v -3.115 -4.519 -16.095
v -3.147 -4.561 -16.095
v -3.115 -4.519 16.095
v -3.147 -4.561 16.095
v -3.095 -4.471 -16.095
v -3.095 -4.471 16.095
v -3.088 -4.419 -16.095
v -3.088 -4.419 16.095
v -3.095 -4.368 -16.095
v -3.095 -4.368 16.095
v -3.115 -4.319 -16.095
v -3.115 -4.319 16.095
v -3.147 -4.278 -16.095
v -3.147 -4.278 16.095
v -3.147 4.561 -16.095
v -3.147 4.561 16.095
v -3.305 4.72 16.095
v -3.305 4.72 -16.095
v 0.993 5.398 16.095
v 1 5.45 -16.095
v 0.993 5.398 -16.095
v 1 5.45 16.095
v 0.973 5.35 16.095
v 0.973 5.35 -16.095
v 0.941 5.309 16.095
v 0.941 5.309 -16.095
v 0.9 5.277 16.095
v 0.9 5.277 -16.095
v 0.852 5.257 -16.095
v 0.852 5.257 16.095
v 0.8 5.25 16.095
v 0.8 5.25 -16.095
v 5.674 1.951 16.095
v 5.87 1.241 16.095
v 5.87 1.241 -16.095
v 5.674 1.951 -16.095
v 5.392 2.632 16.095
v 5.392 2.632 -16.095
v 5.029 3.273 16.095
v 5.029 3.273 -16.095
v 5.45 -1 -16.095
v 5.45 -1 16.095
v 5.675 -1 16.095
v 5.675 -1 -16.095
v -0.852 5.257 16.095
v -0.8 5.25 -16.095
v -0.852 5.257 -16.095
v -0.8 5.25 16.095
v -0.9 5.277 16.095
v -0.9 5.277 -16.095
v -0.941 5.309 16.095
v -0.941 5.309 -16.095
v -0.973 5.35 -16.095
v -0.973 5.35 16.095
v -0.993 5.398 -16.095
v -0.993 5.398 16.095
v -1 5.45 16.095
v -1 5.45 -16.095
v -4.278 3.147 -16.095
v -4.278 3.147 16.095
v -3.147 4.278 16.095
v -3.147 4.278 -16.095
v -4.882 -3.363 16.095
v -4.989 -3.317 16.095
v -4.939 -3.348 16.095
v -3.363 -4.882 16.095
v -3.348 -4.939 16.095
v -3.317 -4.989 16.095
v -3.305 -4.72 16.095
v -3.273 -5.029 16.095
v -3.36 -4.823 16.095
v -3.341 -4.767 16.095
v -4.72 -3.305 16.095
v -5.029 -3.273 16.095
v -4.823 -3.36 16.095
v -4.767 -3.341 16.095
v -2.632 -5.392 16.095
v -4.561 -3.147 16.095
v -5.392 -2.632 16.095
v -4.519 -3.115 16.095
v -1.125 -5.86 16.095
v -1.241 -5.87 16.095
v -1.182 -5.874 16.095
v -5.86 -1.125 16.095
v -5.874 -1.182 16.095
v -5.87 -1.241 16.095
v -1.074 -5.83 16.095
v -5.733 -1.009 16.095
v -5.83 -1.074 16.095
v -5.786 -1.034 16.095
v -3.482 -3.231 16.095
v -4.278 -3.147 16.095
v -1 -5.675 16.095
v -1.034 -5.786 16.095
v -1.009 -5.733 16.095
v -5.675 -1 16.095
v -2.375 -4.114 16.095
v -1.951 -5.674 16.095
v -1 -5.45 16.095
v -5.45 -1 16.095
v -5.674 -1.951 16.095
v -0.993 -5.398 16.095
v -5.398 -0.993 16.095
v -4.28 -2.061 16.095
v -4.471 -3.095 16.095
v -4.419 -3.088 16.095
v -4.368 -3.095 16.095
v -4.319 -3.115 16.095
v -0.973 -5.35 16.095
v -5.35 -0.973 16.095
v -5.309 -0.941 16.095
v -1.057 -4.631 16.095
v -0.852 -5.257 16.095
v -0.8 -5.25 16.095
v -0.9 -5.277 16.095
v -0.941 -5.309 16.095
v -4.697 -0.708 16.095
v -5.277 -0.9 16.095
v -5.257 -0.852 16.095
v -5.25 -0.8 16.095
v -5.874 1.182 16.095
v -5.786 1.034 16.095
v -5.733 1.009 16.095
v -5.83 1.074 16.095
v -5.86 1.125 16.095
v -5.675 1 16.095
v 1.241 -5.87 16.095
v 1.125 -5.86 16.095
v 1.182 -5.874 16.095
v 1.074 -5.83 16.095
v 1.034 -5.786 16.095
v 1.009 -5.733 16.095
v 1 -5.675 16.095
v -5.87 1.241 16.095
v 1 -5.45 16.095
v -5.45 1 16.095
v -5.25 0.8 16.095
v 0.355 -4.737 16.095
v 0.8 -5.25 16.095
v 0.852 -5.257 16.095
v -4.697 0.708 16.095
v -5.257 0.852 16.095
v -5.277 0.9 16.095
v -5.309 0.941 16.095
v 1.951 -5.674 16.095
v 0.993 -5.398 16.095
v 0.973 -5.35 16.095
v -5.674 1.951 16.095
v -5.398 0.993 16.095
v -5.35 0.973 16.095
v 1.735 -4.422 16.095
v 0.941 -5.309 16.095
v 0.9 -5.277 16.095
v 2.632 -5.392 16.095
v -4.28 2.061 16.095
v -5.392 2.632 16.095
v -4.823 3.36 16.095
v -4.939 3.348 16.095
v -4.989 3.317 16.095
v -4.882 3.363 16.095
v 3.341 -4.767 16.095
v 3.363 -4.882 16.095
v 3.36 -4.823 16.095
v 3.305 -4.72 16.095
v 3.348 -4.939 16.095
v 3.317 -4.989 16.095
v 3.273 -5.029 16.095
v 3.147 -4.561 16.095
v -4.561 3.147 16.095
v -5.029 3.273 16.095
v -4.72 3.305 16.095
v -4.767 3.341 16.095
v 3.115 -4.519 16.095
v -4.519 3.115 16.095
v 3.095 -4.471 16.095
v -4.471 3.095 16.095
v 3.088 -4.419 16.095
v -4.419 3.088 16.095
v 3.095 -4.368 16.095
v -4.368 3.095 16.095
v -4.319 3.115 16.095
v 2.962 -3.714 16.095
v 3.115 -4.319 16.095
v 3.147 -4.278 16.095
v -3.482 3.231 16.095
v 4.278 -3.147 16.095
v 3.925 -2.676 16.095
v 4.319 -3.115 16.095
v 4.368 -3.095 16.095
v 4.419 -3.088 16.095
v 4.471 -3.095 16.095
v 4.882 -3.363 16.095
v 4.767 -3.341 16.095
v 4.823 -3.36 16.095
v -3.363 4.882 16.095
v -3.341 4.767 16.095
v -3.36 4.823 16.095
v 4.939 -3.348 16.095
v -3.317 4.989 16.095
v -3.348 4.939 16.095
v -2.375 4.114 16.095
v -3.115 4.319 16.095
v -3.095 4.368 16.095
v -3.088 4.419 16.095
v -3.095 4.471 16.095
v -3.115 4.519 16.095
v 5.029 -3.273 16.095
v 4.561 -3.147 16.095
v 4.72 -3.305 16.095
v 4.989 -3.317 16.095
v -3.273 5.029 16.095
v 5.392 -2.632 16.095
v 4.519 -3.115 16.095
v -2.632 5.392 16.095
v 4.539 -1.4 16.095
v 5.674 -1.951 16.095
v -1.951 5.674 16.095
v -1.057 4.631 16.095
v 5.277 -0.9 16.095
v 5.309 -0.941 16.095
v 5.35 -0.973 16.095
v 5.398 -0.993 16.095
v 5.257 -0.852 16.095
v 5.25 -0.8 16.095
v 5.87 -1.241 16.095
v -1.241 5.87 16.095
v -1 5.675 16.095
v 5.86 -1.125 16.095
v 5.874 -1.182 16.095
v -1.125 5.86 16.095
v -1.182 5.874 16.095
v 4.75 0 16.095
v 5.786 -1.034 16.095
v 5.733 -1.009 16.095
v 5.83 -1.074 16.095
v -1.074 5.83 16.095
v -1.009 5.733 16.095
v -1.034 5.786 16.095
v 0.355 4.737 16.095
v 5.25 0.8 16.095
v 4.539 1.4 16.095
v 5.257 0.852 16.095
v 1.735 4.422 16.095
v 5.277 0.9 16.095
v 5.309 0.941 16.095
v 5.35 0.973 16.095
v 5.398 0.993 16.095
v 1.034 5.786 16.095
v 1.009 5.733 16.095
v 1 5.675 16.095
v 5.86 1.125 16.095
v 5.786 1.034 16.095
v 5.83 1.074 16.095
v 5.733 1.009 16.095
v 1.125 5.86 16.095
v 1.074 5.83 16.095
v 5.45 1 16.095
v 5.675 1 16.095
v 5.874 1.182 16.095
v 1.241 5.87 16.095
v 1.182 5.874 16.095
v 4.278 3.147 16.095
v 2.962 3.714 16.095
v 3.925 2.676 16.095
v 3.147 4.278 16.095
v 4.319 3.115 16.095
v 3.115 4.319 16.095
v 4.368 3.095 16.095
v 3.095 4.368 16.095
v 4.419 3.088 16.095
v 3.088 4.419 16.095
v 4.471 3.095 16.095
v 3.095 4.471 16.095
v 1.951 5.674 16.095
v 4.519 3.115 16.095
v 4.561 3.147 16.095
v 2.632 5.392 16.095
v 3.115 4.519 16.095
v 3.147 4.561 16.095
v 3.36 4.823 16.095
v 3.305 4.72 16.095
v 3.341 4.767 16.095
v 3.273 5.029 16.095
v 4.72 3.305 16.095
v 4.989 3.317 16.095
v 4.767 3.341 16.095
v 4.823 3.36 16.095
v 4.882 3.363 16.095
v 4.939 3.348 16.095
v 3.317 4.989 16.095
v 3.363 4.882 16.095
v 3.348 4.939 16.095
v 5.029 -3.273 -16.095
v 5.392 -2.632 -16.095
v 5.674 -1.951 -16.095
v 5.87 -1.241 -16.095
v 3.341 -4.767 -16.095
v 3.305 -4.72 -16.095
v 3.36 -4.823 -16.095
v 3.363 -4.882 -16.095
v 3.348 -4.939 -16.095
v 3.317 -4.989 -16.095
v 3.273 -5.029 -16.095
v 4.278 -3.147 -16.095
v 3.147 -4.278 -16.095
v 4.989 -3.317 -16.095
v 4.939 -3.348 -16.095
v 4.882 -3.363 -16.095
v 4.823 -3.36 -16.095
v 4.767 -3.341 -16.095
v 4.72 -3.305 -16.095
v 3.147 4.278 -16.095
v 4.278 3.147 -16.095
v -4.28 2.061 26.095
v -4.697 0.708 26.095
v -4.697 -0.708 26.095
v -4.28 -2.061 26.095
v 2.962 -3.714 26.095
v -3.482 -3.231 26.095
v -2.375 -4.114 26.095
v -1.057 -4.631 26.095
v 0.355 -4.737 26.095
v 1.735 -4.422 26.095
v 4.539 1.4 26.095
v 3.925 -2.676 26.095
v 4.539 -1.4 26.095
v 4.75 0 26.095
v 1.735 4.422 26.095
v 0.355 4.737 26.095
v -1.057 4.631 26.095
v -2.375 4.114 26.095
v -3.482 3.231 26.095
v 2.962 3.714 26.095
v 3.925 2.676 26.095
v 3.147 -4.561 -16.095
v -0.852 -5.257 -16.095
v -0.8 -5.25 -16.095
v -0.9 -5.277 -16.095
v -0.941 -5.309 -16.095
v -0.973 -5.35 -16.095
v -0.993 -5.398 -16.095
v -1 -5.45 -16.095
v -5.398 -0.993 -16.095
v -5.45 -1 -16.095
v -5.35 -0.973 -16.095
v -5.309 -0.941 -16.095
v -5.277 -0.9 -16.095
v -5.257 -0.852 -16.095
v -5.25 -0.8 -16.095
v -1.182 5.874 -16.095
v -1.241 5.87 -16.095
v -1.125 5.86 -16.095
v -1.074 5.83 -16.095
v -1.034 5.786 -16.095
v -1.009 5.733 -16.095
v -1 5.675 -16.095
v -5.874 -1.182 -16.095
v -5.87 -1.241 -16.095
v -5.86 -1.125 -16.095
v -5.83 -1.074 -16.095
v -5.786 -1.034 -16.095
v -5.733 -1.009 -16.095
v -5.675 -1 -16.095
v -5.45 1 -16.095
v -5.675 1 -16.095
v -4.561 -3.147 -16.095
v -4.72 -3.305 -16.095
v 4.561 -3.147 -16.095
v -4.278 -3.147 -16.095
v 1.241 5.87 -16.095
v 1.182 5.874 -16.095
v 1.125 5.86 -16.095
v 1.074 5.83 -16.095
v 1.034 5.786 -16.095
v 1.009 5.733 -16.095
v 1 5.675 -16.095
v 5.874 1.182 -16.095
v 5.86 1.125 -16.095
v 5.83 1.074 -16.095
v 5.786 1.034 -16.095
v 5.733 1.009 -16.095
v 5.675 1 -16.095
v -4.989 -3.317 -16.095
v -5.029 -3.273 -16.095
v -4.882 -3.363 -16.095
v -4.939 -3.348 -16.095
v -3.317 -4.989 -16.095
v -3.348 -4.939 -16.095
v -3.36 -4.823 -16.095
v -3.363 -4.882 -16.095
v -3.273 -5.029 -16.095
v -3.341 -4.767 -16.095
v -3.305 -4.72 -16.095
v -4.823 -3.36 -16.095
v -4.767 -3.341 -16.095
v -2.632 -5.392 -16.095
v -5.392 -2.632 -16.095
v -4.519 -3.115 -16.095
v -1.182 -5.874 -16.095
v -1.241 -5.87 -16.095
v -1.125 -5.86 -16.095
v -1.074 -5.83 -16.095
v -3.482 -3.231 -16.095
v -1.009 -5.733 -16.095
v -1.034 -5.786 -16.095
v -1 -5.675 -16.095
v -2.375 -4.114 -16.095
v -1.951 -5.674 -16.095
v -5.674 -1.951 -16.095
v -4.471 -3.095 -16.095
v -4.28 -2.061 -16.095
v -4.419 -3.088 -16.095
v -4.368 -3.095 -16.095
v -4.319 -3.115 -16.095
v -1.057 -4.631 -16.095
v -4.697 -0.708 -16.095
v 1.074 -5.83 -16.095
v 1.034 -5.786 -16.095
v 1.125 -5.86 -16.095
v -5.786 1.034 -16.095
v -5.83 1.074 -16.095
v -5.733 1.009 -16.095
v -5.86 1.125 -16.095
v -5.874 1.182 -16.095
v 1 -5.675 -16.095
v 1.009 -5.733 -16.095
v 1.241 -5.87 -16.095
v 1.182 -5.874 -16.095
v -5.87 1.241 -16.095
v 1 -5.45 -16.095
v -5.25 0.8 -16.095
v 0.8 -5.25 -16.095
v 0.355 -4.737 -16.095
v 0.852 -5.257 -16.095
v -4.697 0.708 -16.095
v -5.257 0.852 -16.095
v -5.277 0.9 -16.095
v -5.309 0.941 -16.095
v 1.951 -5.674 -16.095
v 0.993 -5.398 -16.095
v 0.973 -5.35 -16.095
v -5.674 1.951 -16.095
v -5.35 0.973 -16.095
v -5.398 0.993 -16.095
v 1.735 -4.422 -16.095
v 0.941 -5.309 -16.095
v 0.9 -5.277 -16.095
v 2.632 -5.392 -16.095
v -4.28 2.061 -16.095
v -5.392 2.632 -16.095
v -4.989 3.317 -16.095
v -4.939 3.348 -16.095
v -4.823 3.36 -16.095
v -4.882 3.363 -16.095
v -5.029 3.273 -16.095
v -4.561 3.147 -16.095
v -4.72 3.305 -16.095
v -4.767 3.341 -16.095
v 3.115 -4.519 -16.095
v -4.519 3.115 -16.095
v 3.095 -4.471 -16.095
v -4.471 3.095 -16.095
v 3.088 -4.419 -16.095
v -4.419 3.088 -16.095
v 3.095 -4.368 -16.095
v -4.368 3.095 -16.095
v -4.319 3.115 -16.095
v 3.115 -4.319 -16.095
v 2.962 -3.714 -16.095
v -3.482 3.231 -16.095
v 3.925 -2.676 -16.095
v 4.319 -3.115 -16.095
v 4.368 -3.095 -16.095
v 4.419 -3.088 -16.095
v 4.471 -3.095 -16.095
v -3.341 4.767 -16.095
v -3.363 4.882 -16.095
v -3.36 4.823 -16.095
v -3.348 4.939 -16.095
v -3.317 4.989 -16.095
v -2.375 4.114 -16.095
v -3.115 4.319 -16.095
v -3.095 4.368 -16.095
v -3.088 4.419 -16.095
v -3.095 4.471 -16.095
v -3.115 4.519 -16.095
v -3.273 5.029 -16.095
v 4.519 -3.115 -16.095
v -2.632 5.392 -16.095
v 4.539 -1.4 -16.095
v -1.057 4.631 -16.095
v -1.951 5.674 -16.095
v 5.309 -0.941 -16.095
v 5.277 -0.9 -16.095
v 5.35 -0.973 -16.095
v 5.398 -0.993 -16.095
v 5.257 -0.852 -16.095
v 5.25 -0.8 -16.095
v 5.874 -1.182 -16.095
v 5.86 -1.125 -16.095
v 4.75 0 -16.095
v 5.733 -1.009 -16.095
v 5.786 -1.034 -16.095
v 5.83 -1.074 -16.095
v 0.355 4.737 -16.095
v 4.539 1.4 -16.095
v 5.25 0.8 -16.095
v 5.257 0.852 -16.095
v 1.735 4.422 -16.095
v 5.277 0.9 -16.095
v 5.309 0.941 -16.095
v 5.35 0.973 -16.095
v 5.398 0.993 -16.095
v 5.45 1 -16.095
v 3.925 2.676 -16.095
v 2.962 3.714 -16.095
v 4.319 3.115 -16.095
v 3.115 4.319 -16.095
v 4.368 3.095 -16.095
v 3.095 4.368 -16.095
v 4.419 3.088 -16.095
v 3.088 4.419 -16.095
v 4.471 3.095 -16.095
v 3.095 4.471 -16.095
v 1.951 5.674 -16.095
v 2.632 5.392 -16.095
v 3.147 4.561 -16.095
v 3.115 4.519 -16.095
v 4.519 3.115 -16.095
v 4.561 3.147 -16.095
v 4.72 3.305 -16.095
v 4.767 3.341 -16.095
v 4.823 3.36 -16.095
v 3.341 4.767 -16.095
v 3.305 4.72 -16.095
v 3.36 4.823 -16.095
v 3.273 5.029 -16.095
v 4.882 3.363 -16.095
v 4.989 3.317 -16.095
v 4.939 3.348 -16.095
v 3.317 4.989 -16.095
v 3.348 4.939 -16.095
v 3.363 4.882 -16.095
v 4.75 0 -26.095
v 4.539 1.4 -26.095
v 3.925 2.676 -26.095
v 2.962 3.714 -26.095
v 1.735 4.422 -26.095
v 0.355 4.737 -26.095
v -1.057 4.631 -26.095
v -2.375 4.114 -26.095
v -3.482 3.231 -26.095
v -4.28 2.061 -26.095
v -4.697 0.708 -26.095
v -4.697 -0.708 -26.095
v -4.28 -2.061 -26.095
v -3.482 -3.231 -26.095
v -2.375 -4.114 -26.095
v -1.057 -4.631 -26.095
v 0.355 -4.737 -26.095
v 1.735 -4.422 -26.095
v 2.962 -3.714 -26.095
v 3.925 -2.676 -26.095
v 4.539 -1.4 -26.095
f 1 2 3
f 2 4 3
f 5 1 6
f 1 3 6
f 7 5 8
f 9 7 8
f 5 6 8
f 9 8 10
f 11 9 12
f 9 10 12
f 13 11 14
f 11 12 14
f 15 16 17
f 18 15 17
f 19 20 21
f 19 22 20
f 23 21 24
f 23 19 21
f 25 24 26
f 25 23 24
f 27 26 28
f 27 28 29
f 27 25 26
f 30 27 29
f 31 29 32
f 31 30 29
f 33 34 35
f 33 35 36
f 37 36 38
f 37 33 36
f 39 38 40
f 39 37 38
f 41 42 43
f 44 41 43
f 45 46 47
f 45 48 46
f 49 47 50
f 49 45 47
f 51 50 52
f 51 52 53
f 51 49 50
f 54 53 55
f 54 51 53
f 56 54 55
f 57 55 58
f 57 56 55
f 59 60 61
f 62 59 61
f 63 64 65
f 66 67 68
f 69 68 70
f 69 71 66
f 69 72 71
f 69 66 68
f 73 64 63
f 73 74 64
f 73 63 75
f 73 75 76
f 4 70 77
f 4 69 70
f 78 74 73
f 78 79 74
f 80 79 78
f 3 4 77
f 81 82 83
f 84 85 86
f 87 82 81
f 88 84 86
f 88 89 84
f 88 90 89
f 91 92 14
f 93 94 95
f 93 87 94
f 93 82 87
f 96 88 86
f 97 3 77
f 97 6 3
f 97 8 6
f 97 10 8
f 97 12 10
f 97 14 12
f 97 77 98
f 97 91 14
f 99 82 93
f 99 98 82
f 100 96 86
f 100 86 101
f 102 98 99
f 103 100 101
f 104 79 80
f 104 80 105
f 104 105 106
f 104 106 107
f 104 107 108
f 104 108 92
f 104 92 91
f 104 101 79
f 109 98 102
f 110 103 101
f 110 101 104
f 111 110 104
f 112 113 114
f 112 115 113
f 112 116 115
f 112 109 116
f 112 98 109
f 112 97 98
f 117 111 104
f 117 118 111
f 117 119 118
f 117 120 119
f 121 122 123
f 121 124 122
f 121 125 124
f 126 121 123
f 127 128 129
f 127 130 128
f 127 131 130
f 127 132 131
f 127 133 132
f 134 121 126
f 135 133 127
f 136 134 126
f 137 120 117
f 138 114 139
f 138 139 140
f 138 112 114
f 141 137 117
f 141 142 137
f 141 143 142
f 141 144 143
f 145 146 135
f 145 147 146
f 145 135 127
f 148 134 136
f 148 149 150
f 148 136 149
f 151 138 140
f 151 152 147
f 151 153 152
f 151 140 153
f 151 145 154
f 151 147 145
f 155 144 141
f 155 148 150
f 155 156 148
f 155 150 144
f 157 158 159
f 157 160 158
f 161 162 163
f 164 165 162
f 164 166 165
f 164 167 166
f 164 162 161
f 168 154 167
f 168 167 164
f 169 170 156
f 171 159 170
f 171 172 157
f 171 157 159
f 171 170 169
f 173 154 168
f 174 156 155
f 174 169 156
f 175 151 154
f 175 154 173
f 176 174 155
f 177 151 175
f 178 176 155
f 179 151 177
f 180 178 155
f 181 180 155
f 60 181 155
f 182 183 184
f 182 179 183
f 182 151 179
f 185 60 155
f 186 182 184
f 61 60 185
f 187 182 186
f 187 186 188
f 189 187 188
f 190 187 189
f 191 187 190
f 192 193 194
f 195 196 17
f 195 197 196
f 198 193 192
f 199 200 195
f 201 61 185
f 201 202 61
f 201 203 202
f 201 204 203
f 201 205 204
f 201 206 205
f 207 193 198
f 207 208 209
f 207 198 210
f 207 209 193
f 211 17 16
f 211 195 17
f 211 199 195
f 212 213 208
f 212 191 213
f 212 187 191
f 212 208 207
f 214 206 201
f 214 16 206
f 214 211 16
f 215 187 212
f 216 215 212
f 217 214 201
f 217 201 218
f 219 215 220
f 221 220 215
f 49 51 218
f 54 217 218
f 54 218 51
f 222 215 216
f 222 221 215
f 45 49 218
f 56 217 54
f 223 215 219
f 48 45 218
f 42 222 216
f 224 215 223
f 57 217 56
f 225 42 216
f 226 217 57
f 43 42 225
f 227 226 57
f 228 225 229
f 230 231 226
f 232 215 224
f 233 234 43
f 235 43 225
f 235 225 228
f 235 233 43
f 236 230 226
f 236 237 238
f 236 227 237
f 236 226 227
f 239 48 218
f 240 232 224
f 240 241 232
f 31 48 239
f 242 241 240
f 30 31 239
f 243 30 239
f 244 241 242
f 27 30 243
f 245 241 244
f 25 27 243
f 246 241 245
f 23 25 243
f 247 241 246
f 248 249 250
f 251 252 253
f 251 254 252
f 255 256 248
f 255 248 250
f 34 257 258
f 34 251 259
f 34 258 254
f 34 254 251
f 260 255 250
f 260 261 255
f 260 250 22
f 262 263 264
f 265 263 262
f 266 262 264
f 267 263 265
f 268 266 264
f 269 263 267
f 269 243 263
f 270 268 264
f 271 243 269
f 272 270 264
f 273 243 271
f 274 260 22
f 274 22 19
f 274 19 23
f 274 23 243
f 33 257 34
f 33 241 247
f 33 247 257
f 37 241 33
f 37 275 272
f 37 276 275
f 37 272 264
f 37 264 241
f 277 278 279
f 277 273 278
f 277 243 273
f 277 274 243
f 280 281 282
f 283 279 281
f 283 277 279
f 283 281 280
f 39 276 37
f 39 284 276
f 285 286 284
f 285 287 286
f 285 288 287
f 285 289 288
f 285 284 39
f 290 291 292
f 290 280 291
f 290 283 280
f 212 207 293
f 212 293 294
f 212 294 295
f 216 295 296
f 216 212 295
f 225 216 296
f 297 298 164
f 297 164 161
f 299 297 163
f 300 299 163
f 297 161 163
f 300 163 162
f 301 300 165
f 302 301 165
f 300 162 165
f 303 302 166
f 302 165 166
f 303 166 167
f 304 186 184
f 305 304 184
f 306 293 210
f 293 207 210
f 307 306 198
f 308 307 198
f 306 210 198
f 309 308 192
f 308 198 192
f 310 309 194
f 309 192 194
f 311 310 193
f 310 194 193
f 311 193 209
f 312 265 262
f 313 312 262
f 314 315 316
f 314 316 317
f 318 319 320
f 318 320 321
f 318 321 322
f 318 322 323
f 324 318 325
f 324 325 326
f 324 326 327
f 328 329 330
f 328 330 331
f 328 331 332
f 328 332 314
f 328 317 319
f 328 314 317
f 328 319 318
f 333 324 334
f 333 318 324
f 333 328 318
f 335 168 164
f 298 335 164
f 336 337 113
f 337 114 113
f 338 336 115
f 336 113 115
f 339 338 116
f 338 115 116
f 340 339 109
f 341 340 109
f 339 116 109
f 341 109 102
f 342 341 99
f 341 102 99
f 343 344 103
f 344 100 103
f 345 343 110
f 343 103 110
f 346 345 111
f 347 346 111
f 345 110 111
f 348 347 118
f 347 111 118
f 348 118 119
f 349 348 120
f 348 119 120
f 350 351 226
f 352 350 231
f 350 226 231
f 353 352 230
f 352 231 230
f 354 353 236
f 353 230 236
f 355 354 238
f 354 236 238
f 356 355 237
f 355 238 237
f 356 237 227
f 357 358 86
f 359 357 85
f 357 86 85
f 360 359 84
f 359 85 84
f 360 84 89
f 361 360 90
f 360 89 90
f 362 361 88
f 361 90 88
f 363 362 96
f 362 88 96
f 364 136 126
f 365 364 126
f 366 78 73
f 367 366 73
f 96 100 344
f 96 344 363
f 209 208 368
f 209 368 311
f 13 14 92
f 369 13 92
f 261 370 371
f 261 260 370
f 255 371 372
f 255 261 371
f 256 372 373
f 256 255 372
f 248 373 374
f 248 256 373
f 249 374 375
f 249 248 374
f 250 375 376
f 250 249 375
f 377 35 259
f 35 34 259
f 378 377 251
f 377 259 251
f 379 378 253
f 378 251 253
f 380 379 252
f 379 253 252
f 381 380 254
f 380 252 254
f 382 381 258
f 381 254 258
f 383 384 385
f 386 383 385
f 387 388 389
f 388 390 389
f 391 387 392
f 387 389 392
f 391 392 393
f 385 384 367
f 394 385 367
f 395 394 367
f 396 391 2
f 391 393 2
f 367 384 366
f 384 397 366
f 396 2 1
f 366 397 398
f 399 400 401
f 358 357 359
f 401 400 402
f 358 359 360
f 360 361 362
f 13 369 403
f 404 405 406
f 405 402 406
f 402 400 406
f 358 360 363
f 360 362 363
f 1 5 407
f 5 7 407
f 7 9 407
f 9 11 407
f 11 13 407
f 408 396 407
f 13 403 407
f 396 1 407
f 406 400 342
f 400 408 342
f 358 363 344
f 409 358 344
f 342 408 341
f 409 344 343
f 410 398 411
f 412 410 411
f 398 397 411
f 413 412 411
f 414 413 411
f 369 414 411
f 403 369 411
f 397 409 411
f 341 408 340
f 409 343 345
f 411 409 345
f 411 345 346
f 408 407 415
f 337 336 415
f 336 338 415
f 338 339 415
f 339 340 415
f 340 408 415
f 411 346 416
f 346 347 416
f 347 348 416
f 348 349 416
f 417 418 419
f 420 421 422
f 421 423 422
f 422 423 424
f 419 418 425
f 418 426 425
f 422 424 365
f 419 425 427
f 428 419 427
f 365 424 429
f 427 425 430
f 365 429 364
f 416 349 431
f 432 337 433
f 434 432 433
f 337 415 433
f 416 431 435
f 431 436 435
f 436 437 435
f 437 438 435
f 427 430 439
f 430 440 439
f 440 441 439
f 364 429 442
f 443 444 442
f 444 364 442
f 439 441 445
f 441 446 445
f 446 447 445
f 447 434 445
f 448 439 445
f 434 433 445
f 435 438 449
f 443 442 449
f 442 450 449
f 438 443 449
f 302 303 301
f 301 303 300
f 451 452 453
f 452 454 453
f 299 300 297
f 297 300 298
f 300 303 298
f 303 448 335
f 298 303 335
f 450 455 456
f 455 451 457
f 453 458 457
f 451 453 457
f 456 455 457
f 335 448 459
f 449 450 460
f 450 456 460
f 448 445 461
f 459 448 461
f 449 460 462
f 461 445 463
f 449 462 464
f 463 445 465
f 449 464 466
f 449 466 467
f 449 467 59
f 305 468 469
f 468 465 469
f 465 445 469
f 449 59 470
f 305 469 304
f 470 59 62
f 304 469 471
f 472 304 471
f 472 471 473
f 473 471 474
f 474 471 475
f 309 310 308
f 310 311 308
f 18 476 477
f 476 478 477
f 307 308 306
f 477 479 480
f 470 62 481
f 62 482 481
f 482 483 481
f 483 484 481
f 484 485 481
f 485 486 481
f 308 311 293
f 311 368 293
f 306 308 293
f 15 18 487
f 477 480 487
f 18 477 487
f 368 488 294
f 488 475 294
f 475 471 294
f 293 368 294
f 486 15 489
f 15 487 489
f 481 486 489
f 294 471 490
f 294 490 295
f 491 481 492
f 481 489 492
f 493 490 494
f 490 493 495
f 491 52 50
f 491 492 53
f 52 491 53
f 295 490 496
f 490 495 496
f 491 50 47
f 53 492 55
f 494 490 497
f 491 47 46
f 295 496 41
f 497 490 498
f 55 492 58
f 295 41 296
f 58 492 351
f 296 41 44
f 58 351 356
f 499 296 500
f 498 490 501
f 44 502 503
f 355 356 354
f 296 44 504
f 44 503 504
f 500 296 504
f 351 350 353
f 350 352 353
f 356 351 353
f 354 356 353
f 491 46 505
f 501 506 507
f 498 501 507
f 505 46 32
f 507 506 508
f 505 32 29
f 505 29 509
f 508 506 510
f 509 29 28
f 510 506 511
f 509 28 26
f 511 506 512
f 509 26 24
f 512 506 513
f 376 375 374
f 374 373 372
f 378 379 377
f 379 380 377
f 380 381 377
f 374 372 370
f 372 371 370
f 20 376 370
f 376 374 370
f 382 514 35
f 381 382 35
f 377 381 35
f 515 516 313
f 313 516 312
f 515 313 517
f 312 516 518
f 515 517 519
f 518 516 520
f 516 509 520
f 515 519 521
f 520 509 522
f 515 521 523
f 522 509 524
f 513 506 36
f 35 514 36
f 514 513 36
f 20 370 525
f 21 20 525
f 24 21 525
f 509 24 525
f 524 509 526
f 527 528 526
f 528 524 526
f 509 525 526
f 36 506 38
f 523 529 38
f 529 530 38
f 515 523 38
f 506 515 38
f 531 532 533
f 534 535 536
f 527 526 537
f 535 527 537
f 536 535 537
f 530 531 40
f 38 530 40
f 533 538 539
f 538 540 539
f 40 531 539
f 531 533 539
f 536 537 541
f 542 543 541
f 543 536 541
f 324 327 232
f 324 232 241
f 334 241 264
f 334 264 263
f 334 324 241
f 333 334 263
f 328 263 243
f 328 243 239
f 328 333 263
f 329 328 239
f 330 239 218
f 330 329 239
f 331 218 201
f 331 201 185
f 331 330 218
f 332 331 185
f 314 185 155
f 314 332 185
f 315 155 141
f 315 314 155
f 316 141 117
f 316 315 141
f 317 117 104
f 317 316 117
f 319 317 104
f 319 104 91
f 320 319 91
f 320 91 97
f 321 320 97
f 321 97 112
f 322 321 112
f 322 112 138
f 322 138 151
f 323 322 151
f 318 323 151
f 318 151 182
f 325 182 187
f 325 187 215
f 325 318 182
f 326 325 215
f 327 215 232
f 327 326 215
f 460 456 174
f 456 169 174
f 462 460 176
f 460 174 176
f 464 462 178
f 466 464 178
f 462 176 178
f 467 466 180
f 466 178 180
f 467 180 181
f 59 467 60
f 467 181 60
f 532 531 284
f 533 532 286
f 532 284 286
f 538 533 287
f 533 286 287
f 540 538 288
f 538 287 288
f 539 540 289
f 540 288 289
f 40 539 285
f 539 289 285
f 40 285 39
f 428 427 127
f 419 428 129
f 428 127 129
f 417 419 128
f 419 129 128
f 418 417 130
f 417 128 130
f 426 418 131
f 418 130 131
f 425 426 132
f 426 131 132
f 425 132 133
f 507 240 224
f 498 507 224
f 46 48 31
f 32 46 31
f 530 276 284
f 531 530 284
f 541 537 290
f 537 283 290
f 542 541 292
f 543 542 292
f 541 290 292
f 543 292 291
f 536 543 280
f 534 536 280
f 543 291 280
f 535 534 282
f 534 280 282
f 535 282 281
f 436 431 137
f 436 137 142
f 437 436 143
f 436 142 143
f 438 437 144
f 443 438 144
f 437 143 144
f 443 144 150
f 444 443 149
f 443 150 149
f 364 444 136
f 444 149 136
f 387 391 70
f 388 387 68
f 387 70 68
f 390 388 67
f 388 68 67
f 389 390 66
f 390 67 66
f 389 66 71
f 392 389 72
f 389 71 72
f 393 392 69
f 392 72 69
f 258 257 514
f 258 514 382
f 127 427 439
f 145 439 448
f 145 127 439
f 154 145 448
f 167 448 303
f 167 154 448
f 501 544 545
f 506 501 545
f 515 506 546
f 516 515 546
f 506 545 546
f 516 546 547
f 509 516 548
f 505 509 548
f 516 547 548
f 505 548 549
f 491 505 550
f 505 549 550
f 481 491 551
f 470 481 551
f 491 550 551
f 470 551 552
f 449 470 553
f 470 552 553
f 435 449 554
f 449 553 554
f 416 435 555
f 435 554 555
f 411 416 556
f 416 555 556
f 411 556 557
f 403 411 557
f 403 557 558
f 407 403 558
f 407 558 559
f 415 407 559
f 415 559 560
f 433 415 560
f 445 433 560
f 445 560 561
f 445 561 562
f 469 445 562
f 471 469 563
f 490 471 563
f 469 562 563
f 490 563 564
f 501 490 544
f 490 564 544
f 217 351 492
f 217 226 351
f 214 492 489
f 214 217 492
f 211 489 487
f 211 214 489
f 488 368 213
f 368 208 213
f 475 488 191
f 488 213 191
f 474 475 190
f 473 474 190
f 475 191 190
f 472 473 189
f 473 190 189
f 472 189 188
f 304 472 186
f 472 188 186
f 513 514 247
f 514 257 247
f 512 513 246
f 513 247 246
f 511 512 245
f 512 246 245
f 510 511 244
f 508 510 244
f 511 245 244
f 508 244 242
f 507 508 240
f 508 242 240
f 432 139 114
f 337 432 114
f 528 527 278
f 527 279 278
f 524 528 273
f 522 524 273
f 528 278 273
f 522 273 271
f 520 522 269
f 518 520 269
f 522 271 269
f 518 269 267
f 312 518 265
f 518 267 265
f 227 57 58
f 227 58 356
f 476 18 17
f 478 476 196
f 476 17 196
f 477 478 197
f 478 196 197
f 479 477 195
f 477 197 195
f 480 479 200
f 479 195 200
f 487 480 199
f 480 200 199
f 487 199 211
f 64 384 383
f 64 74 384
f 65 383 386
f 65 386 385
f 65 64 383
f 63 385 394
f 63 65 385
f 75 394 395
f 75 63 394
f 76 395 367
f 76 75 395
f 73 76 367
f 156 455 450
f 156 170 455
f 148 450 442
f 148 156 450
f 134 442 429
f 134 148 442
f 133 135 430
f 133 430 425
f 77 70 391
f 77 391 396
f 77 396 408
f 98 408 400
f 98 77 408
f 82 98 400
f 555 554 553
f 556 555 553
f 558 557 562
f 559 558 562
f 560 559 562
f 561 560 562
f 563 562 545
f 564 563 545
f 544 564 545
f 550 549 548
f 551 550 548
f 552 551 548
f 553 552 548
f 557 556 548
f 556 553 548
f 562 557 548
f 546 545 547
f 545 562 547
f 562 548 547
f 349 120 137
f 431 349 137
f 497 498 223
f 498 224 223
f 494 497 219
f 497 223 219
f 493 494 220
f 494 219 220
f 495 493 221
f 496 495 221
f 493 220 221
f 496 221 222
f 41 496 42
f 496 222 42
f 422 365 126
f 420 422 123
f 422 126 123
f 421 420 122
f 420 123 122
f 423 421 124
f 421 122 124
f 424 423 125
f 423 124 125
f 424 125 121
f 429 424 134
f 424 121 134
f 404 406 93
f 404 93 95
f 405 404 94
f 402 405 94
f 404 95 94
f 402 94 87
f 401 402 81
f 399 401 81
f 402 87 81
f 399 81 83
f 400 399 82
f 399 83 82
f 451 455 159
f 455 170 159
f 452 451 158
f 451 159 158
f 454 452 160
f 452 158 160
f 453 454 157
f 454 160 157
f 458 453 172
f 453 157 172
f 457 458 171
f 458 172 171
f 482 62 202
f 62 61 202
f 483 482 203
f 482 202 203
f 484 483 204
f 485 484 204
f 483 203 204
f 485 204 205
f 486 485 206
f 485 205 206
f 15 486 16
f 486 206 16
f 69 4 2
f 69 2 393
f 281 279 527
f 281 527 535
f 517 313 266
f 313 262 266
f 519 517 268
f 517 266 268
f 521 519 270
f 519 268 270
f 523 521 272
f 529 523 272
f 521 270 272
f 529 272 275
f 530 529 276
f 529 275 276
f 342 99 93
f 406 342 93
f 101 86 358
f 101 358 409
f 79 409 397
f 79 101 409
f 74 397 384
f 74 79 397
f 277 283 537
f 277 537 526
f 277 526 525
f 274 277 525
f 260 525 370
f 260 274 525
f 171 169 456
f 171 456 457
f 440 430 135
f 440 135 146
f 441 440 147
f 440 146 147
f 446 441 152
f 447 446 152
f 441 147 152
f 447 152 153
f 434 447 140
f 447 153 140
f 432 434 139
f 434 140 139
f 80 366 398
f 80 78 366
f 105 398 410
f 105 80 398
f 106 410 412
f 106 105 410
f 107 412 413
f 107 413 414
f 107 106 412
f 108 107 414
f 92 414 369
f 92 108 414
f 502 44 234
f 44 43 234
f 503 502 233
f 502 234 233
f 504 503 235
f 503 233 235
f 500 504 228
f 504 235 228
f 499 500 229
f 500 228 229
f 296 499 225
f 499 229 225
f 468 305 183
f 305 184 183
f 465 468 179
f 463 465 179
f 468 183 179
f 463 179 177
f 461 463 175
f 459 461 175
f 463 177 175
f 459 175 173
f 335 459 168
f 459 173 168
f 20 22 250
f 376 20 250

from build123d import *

# Parameters (mm, degrees)
SKETCH1_R                = 6
BOSS_EXTRUDE1_DEPTH      = 26.095
SKETCH2_OUTSIDE_W        = 24.976
SKETCH2_OUTSIDE_H        = 24.976
SKETCH2_OUTSIDE_R        = 4.75
CUT_EXTRUDE1_DEPTH       = 10
SKETCH3_W                = 2
SKETCH3_H                = 2
CUT_EXTRUDE2_DEPTH       = 28.439916636
FILLET1_R                = 0.2
CIRPATTERN1_COUNT        = 8
FILLET1_OF_CIRPATTERN1_R = 0.2


with BuildPart() as part:
    # Sketch1 → Boss-Extrude1 (new, symmetric)
    with BuildSketch(Plane.XY):
        Circle(SKETCH1_R)
    extrude(amount=BOSS_EXTRUDE1_DEPTH, both=True)

    # Sketch2 outside → Cut-Extrude1 (cut)
    with BuildSketch(Plane.XY.offset(26.095)):
        Rectangle(SKETCH2_OUTSIDE_W, SKETCH2_OUTSIDE_H)
        Circle(SKETCH2_OUTSIDE_R, mode=Mode.SUBTRACT)
    cut_extrude1 = extrude(amount=-CUT_EXTRUDE1_DEPTH, mode=Mode.SUBTRACT)

    # Mirror1: Cut-Extrude1 across plane
    add(cut_extrude1.mirror(Plane.XY), mode=Mode.SUBTRACT)

    # Sketch3 → Cut-Extrude2 (cut, symmetric)
    with BuildSketch(Plane.XY):
        with Locations((0, 6.25)):
            Rectangle(SKETCH3_W, SKETCH3_H)
    cut_extrude2 = extrude(amount=CUT_EXTRUDE2_DEPTH, both=True, mode=Mode.SUBTRACT)

    # Fillet1
    fillet1_edges = [part.edges().sort_by_distance(p)[0] for p in [
        (1, 5.916079783, 0),
        (1, 5.25, 0),
        (-1, 5.916079783, 0),
        (-1, 5.25, 0),
    ]]
    fillet(fillet1_edges, radius=FILLET1_R)

    # CirPattern1: Cut-Extrude2 ×8 about axis
    cirpattern1_axis = Axis((0, 0, 0), (0, 0, 1))
    for i in range(1, CIRPATTERN1_COUNT):
        add(cut_extrude2.rotate(cirpattern1_axis, i * 360 / CIRPATTERN1_COUNT), mode=Mode.SUBTRACT)

    # Fillet1 of CirPattern1
    fillet1_of_cirpattern1_edges = [part.edges().sort_by_distance(p)[0] for p in [
        (-3.476193351, 4.890406914, 0),
        (-3.00520382, 4.419417382, 0),
        (-4.890406914, 3.476193351, 0),
        (-4.419417382, 3.00520382, 0),
        (-5.916079783, 1, 0),
        (-5.25, 1, 0),
        (-5.916079783, -1, 0),
        (-5.25, -1, 0),
        (-4.890406914, -3.476193351, 0),
        (-4.419417382, -3.00520382, 0),
        (-3.476193351, -4.890406914, 0),
        (-3.00520382, -4.419417382, 0),
        (-1, -5.916079783, 0),
        (-1, -5.25, 0),
        (1, -5.916079783, 0),
        (1, -5.25, 0),
        (3.476193351, -4.890406914, 0),
        (3.00520382, -4.419417382, 0),
        (4.890406914, -3.476193351, 0),
        (4.419417382, -3.00520382, 0),
        (5.916079783, -1, 0),
        (5.25, -1, 0),
        (5.916079783, 1, 0),
        (5.25, 1, 0),
        (4.890406914, 3.476193351, 0),
        (4.419417382, 3.00520382, 0),
        (3.476193351, 4.890406914, 0),
        (3.00520382, 4.419417382, 0),
    ]]
    fillet(fillet1_of_cirpattern1_edges, radius=FILLET1_OF_CIRPATTERN1_R)


solid = part.part
